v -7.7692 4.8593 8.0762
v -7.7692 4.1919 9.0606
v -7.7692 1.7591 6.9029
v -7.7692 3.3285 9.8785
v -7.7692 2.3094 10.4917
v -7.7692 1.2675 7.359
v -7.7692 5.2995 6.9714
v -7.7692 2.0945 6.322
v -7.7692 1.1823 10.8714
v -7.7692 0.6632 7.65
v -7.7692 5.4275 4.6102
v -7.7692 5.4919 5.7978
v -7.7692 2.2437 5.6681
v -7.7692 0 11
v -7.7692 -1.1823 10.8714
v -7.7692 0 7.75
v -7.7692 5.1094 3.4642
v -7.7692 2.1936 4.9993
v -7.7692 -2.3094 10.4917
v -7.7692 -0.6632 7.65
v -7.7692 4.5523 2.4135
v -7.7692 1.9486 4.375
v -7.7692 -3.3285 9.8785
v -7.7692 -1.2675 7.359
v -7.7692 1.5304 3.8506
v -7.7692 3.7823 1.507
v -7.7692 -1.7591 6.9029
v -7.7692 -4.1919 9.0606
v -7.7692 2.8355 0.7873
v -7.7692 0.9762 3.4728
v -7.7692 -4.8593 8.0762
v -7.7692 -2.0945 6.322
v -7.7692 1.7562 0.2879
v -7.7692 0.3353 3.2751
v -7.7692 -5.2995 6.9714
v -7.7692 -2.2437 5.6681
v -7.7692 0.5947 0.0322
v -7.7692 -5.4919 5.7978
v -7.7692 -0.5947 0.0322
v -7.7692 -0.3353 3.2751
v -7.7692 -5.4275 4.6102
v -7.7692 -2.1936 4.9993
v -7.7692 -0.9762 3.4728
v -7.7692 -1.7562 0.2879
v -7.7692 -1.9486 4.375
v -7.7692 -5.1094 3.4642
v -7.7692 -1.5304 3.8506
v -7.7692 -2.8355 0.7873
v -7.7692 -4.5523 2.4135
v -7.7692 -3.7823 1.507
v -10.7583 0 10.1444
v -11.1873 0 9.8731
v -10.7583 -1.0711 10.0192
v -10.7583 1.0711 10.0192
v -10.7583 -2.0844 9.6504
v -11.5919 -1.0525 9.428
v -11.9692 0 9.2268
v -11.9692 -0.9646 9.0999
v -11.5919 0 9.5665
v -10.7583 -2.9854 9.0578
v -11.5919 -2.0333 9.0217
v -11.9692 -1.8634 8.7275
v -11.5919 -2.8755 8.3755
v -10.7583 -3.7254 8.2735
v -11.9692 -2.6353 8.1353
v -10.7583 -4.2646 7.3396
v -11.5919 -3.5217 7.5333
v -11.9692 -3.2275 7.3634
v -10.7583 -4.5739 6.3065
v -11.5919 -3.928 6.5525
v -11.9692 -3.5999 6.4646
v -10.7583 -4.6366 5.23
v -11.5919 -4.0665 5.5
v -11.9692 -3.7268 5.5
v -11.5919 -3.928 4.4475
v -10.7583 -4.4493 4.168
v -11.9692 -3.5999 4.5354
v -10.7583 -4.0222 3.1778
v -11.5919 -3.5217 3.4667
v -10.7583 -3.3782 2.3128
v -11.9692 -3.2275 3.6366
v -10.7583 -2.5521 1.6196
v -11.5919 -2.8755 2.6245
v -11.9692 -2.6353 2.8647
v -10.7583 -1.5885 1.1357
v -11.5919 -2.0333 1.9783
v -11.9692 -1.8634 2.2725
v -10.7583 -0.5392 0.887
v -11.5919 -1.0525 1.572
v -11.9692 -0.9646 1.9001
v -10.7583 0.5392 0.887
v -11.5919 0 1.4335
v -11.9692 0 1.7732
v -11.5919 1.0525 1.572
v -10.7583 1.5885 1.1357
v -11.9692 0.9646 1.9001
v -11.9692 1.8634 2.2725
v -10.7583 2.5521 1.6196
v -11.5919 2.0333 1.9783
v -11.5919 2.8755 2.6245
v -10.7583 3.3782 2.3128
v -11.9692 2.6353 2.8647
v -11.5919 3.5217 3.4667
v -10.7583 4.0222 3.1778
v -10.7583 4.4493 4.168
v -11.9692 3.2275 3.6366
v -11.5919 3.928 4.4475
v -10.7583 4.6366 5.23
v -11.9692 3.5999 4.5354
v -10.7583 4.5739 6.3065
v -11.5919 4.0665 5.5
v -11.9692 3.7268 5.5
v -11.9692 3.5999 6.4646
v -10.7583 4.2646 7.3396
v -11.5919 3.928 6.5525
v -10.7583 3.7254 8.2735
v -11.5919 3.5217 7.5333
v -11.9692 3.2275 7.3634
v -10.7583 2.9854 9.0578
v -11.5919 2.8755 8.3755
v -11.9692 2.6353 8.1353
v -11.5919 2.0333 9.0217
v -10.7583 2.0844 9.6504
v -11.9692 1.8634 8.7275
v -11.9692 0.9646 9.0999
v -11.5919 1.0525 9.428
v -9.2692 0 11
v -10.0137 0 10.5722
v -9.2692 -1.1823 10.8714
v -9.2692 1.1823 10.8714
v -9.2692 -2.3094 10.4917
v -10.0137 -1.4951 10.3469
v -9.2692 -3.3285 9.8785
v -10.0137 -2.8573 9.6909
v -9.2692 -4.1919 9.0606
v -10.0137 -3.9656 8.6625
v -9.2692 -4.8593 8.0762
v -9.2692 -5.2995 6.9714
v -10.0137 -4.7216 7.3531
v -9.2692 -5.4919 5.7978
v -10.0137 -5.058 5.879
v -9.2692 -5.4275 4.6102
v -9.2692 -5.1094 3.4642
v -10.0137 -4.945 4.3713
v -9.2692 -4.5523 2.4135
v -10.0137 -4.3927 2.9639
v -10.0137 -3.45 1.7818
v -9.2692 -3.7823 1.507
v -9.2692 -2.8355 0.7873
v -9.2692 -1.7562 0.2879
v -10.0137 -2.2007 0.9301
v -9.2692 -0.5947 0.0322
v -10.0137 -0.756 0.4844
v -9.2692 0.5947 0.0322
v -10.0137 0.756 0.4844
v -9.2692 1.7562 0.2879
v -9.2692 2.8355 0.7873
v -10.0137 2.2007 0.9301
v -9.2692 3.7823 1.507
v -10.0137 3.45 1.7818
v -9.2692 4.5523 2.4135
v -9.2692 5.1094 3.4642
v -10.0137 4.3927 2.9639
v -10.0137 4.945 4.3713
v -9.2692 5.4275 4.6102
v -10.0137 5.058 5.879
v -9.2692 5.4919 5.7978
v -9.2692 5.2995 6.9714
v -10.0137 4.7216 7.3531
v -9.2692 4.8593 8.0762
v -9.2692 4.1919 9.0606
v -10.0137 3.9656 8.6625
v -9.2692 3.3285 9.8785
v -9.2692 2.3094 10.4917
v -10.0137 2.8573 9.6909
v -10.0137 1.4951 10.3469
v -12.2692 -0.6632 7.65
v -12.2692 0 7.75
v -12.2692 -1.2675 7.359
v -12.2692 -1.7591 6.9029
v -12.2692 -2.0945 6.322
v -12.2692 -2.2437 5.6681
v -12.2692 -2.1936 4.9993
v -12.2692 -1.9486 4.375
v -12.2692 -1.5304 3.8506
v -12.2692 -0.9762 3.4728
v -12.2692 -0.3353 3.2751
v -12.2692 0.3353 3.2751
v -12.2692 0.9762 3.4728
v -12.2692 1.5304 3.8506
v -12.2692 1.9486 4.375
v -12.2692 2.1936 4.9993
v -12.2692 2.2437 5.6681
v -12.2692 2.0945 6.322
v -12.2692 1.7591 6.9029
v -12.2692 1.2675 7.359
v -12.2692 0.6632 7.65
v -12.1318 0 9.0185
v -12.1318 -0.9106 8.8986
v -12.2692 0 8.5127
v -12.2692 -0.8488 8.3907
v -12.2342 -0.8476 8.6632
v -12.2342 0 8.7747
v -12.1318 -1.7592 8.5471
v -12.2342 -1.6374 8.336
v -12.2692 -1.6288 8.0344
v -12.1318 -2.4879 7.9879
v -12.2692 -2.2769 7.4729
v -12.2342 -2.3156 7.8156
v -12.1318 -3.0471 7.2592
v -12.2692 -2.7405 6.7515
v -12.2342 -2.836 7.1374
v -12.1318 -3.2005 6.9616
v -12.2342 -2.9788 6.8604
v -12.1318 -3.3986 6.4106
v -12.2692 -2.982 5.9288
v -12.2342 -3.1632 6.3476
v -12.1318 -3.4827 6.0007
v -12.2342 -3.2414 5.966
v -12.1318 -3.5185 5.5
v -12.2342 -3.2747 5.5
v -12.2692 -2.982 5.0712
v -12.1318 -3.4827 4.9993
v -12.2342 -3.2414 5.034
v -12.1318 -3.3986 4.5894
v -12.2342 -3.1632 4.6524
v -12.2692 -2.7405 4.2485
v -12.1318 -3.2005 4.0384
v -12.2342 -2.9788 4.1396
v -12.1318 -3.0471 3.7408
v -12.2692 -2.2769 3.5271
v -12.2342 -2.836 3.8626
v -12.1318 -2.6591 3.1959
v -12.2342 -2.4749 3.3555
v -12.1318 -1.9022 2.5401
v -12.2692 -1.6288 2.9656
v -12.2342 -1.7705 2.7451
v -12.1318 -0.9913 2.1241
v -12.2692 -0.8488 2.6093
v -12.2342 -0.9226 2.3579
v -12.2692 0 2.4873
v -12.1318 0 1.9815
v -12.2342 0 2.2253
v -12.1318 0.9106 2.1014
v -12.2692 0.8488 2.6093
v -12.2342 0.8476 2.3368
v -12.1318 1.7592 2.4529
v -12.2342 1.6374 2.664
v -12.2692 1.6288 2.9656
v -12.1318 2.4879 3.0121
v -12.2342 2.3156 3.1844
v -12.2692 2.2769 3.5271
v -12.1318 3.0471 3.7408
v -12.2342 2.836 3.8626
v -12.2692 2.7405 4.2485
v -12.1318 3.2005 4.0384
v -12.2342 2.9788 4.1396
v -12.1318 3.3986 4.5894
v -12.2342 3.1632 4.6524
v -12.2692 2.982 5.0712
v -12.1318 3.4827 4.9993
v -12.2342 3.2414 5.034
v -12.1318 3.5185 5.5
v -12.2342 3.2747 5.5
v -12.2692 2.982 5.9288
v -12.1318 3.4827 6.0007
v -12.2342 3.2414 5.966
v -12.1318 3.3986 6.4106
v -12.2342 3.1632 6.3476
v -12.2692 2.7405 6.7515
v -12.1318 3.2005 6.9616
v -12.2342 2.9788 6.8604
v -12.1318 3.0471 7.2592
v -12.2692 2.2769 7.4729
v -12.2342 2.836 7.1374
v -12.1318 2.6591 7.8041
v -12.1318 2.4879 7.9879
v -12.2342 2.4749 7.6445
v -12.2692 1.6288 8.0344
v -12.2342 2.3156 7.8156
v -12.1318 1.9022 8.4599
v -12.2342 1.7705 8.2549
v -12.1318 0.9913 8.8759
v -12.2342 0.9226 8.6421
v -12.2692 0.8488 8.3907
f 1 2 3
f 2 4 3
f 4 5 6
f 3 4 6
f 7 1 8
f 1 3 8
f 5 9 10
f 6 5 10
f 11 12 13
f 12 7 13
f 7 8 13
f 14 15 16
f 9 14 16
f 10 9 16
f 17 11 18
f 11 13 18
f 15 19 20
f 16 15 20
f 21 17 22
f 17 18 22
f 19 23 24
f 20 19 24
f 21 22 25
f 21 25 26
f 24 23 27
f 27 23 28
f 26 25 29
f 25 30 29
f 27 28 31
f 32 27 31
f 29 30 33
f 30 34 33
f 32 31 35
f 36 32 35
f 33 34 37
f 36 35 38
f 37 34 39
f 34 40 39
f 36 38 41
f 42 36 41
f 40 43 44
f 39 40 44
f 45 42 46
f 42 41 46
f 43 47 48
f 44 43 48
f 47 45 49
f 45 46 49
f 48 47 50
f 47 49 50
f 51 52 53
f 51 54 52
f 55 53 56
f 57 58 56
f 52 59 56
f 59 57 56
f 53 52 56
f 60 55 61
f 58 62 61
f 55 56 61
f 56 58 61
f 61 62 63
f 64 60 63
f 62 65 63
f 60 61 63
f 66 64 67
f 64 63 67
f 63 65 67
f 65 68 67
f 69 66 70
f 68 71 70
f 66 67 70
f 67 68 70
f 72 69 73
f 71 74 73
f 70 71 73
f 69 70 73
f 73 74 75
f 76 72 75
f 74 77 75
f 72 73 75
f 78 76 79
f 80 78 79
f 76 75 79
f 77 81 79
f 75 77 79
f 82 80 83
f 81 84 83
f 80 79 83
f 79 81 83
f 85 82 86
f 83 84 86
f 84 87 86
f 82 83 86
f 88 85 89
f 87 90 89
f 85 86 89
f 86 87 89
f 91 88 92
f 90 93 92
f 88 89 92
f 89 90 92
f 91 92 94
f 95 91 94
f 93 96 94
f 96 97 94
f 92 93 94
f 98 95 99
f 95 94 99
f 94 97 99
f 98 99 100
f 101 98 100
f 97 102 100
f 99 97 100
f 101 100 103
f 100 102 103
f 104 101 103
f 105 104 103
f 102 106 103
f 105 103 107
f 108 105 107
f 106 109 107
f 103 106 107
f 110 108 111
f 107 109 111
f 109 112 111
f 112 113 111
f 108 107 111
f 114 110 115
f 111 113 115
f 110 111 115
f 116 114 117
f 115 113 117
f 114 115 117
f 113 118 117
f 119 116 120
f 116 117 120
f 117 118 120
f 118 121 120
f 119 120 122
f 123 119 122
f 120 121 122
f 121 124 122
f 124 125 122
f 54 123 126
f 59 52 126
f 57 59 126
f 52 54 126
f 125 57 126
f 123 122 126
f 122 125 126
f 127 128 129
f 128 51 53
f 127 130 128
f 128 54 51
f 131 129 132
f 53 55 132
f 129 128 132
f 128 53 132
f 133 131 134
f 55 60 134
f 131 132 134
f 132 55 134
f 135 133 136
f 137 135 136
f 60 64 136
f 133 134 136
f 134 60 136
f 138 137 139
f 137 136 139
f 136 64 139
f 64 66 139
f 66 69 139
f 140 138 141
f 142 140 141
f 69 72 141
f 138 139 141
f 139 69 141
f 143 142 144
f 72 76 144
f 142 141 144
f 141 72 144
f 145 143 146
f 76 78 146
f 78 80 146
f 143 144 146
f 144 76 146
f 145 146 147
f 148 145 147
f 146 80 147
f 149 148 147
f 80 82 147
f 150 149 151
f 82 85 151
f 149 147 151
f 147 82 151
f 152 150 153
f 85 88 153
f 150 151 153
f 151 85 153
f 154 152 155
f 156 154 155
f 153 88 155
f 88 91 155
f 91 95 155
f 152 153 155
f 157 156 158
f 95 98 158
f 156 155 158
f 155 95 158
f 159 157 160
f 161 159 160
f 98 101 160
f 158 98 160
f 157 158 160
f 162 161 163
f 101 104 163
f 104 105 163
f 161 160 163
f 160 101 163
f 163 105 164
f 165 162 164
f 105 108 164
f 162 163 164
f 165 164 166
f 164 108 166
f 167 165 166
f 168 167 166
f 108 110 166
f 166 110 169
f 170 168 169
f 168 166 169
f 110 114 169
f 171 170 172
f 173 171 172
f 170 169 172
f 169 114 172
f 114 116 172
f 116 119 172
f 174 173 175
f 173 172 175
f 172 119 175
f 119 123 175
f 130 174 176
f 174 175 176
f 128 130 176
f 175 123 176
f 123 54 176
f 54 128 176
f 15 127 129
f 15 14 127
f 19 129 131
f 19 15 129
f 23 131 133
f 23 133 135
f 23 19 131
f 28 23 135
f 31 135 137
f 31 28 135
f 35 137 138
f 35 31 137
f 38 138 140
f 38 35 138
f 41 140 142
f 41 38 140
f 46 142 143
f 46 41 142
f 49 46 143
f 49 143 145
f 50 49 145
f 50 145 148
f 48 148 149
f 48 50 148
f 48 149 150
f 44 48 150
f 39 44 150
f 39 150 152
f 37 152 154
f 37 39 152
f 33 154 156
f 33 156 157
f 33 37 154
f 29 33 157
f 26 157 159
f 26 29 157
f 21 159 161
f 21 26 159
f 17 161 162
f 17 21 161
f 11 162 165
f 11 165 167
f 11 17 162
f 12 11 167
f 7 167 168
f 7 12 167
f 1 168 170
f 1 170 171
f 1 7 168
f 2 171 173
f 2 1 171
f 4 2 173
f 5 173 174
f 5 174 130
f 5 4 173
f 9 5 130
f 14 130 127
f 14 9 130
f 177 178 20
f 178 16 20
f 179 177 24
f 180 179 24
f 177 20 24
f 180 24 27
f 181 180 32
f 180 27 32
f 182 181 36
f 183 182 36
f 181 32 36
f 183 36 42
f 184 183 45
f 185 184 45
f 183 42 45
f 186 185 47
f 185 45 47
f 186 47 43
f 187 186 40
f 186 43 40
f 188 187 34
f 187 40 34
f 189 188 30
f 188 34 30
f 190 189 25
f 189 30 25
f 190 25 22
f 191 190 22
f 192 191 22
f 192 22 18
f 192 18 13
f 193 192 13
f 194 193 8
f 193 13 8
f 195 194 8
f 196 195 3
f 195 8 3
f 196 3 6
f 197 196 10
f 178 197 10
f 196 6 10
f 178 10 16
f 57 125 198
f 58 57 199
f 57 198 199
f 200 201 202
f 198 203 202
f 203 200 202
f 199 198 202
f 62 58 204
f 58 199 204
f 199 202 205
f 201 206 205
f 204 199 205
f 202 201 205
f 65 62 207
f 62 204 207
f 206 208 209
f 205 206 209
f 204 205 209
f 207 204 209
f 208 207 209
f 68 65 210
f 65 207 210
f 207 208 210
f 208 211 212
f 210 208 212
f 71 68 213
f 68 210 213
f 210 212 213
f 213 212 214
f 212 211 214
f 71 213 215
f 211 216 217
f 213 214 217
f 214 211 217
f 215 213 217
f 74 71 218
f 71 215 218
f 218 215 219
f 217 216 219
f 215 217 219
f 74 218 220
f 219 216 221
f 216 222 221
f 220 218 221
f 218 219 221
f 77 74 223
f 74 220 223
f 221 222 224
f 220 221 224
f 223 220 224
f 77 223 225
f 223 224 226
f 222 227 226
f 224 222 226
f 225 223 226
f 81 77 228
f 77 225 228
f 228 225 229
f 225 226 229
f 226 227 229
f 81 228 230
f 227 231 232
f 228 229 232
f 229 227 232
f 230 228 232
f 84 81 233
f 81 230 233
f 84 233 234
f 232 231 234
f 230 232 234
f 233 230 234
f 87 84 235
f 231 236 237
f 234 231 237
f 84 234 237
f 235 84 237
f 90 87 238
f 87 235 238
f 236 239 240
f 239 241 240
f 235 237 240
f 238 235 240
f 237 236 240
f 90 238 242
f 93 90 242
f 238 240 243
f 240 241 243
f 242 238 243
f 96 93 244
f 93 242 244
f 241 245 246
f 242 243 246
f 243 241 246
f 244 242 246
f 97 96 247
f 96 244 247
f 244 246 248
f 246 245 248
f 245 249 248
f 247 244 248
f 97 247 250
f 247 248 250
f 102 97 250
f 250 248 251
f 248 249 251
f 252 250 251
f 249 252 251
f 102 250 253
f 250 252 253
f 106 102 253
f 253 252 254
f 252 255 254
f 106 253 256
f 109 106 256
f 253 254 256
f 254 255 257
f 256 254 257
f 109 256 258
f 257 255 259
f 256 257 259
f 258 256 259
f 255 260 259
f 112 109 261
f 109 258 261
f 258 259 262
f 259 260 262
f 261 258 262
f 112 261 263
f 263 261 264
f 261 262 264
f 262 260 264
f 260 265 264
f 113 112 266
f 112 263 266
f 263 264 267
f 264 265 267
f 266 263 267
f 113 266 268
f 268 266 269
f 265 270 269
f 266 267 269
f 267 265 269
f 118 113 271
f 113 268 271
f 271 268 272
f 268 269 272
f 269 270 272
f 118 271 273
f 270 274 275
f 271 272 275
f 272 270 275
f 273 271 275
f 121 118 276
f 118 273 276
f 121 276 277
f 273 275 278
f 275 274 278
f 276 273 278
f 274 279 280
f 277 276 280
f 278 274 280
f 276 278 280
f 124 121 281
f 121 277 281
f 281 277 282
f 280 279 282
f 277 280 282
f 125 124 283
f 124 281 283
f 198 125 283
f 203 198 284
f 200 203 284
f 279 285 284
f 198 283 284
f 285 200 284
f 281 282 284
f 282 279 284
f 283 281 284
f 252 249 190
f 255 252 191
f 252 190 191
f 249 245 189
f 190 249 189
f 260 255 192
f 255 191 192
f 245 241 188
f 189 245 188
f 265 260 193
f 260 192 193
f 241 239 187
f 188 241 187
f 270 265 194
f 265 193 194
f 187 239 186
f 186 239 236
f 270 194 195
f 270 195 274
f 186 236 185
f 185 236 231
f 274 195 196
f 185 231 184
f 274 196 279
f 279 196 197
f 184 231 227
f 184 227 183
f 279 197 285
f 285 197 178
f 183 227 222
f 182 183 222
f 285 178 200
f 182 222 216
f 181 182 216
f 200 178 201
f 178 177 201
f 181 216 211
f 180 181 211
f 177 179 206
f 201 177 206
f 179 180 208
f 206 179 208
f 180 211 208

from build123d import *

# Parameters (mm, degrees)
F0_W = 1.5
F0_H = 3.25


with BuildPart() as f1:
    # F0 (on Front) → F1 (revolve)
    with BuildSketch(Plane.XZ):
        with BuildLine():
            Line((-9.269153, 7.75), (-9.269153, 11))
            Line((-9.269153, 11), (-10.758264, 10.144415))
            ThreePointArc((-10.758264, 10.144415), (-11.392868, 9.724113), (-11.969153, 9.226848))
            ThreePointArc((-11.969153, 9.226848), (-12.191108, 8.900003), (-12.269153, 8.512705))
            Line((-12.269153, 8.512705), (-12.269153, 7.75))
            Line((-12.269153, 7.75), (-9.269153, 7.75))
        make_face()
        with Locations((-8.519153, 9.375)):
            Rectangle(F0_W, F0_H)
    revolve(axis=Axis((-10.019153, 0, 5.5), (1, 0, 0)))


solid = f1.part
